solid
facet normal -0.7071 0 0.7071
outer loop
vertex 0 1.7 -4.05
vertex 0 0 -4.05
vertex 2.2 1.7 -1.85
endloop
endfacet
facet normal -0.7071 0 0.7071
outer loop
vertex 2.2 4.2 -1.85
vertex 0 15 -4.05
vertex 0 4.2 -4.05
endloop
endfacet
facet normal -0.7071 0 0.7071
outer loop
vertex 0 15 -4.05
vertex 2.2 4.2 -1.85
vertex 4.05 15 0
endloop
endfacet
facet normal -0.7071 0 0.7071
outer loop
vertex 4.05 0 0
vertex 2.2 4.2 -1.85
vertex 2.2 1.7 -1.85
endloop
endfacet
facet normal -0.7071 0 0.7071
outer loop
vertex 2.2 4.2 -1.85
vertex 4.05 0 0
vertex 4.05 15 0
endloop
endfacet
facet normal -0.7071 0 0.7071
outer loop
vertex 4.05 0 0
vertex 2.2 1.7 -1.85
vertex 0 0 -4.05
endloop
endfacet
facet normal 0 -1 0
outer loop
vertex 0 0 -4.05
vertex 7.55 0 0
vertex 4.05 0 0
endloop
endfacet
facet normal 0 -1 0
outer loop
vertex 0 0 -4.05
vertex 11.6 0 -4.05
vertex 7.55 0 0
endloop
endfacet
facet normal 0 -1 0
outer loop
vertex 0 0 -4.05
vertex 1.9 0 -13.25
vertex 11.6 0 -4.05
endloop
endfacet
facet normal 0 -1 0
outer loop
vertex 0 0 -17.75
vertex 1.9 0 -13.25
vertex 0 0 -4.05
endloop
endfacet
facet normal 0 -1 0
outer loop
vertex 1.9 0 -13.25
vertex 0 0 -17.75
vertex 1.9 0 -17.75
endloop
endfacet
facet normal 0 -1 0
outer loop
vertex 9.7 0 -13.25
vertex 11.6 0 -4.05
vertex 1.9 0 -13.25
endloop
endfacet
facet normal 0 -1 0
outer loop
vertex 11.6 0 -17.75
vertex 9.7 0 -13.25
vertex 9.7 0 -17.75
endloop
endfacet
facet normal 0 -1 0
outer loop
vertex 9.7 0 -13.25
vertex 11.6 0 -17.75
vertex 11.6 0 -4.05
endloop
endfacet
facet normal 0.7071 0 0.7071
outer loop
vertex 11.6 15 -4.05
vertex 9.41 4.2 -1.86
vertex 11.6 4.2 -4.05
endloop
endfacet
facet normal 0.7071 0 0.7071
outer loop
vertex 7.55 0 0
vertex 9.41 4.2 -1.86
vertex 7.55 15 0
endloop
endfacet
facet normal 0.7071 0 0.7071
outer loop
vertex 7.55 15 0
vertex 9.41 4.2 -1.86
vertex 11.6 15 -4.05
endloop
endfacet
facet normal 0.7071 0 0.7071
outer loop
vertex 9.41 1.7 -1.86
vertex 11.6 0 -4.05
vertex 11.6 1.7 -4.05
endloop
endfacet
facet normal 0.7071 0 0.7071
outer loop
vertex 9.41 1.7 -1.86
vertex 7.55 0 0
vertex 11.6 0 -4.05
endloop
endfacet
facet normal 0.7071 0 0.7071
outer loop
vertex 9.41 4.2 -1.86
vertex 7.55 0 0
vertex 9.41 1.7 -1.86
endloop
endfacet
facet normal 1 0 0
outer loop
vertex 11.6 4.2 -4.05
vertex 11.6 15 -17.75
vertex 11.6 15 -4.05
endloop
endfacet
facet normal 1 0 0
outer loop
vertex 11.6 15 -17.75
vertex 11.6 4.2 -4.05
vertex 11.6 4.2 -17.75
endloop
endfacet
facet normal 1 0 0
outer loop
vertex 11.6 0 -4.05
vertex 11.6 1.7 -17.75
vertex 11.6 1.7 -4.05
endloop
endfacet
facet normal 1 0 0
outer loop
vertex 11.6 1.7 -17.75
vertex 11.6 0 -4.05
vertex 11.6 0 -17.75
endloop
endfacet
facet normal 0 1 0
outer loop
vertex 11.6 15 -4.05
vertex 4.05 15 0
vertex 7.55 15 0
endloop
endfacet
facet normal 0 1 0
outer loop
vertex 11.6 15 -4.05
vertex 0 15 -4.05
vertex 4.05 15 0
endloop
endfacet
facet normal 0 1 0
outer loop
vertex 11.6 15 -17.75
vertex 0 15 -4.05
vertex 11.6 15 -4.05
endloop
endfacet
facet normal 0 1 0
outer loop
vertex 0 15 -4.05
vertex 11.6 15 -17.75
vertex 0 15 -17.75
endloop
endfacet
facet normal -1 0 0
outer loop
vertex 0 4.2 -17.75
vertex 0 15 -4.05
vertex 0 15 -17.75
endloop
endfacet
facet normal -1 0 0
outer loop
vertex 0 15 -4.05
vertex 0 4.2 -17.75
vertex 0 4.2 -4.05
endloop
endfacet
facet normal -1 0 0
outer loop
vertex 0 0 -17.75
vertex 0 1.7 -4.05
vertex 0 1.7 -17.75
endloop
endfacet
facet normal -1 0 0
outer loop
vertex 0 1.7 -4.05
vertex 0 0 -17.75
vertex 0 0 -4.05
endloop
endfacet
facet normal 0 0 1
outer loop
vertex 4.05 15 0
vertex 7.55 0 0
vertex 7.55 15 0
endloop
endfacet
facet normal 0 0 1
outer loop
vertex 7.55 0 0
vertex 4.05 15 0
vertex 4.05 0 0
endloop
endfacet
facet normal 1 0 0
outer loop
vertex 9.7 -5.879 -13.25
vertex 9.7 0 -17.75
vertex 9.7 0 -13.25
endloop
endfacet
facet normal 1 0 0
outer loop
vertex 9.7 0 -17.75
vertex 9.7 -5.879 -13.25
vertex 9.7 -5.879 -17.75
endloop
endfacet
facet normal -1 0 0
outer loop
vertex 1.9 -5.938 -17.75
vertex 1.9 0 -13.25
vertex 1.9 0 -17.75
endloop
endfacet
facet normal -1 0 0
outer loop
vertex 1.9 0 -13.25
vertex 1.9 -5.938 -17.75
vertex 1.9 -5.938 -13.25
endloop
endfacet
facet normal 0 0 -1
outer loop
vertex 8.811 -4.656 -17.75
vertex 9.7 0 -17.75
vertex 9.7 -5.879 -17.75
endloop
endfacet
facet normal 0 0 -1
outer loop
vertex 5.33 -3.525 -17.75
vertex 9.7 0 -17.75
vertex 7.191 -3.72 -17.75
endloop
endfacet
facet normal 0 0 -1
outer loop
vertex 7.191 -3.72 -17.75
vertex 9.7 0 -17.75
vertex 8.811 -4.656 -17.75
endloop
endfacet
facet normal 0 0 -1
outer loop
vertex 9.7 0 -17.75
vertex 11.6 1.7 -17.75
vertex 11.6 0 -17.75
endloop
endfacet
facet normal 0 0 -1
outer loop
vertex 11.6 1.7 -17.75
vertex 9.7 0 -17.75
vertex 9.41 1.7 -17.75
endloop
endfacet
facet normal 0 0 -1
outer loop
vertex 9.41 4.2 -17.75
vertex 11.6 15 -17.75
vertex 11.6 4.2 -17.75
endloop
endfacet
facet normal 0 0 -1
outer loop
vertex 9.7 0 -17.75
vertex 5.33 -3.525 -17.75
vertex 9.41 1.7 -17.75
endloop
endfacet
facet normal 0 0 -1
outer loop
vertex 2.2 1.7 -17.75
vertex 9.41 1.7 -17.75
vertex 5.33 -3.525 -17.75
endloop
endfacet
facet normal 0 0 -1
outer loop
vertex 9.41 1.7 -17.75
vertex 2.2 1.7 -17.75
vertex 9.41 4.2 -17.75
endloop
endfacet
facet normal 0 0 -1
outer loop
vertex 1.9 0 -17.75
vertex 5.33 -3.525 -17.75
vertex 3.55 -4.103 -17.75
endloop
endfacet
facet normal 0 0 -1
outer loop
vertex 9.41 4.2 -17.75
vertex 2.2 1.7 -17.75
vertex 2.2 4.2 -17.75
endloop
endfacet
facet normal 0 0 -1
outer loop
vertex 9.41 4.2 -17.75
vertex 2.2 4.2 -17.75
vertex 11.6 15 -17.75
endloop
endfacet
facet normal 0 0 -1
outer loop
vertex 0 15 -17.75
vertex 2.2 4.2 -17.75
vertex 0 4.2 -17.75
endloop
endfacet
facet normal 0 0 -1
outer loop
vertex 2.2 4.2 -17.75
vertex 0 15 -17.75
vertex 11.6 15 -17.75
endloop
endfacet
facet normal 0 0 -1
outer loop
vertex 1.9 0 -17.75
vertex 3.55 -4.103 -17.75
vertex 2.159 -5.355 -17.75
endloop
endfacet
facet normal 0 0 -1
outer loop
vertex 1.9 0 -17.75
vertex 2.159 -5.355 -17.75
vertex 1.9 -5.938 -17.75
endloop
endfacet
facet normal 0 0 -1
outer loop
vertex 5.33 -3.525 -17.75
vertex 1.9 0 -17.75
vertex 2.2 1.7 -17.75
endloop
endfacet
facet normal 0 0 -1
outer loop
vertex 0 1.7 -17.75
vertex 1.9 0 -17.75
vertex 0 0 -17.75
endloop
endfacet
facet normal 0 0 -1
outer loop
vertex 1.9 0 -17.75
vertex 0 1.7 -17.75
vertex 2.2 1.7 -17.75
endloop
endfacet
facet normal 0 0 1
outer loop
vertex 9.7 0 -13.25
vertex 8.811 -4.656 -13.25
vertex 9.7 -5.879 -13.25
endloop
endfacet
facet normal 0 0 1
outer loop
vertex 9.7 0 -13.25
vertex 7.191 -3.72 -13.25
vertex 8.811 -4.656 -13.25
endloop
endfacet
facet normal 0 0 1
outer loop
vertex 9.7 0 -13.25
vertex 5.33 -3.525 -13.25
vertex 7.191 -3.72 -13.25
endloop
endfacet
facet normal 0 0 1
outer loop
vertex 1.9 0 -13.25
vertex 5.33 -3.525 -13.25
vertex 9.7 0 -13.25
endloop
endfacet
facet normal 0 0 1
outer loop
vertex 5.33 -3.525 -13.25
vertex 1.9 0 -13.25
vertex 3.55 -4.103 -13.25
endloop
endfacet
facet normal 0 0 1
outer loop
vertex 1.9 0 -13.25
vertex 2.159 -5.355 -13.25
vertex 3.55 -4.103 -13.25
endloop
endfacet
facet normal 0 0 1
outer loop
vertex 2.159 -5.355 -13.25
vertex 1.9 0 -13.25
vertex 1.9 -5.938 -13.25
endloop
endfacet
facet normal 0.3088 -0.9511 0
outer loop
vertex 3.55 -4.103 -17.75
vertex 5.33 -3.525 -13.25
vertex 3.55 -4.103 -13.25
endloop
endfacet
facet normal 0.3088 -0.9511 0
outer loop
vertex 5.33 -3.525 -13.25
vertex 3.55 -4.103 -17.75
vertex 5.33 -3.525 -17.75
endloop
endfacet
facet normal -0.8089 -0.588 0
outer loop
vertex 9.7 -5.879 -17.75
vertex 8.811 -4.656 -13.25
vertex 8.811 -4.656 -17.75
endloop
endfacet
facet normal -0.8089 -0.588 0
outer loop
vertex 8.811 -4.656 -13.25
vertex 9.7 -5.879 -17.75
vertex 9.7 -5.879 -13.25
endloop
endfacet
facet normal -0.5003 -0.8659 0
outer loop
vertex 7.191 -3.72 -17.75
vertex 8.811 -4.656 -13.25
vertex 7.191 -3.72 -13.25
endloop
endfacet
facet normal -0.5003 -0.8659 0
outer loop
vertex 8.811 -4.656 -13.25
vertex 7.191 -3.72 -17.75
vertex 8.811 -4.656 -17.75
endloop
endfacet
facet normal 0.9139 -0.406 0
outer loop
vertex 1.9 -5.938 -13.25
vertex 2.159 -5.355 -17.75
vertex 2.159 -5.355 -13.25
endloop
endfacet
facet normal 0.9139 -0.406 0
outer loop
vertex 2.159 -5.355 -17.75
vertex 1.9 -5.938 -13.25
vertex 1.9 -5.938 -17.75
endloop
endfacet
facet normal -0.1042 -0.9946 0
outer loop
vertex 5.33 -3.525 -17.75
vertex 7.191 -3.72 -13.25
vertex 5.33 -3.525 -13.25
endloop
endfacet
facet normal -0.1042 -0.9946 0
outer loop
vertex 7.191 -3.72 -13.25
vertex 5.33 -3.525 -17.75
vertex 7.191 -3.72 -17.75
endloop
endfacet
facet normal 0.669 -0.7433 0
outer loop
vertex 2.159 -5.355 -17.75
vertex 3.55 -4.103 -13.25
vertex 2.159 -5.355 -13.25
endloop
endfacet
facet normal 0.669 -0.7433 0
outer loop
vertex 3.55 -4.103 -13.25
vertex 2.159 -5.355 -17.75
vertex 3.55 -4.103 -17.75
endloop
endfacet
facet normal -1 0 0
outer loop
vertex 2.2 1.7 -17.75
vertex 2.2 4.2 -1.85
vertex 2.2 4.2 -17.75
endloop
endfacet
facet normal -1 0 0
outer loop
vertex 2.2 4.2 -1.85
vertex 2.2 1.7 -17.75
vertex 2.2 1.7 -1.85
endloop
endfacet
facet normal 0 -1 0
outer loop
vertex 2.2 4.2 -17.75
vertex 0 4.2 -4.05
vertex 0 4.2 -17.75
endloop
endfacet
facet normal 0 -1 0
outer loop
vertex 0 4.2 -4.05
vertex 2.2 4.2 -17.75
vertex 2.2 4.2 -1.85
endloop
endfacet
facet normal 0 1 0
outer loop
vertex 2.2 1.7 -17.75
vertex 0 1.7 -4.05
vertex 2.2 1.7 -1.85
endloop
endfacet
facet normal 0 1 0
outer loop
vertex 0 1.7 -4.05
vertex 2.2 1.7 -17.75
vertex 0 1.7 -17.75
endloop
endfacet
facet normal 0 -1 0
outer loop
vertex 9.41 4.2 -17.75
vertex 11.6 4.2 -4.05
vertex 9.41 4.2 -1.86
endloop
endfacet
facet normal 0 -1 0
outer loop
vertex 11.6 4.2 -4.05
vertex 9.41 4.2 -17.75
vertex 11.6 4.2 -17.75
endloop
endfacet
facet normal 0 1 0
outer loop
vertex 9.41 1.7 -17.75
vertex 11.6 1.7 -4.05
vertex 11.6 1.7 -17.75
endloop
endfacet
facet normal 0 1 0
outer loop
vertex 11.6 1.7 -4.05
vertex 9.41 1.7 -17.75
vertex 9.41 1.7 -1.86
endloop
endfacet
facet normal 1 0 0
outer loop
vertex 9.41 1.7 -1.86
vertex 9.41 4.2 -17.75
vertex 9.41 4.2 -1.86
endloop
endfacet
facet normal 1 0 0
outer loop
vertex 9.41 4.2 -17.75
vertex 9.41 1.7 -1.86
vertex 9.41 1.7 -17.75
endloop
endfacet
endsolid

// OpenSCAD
//jaw width
jw = 12-.4;

//jaw length
jl = 35-17.25;

//jaw max thickness
jmaxth = 15;

//jaw medium thickness
jmedth = 15;

//jaw min thickness
jminth = 15;


module jaw()
{

    //fins
    //translate([0,5.75,0])
    //cube([jw, jl-5.75, 1.9]);
    

    difference()
    {
    
    union()
    {    
    intersection()
    {
    translate([jw/2,-1.75,0])
    rotate(45)
    cube([jw+2,jw+2,jmaxth+.1]);
    
    cube([jw, jl/3, jmaxth]);
    }
    
    translate([0,jl/3,0])
    cube([jw, jl/3, jmedth]);
    translate([0,2*jl/3,0])
    cube([jw, jl/3, jminth]);
    
    //guide
    difference()
    {
    translate([jw/2-3.9,5.75+4+4-.5,-6])
    cube([7.8, 4+.5, 6]);
 
     
    translate([jw/2,20,-8])
    rotate([90,0,0])
    cylinder(d=9, h=jmaxth+2);
       
    }
    }
    
    //grooves (fins)
    translate([0,0,2-.3])
    cube([2+.2,jl+1,2.5]);
    
    translate([jw-1.99-.2,0,2-.3])
    cube([2+.2,jl+1,2.5]);
    
    }
    
    
    
}

rotate([-90,0,0])

jaw();
